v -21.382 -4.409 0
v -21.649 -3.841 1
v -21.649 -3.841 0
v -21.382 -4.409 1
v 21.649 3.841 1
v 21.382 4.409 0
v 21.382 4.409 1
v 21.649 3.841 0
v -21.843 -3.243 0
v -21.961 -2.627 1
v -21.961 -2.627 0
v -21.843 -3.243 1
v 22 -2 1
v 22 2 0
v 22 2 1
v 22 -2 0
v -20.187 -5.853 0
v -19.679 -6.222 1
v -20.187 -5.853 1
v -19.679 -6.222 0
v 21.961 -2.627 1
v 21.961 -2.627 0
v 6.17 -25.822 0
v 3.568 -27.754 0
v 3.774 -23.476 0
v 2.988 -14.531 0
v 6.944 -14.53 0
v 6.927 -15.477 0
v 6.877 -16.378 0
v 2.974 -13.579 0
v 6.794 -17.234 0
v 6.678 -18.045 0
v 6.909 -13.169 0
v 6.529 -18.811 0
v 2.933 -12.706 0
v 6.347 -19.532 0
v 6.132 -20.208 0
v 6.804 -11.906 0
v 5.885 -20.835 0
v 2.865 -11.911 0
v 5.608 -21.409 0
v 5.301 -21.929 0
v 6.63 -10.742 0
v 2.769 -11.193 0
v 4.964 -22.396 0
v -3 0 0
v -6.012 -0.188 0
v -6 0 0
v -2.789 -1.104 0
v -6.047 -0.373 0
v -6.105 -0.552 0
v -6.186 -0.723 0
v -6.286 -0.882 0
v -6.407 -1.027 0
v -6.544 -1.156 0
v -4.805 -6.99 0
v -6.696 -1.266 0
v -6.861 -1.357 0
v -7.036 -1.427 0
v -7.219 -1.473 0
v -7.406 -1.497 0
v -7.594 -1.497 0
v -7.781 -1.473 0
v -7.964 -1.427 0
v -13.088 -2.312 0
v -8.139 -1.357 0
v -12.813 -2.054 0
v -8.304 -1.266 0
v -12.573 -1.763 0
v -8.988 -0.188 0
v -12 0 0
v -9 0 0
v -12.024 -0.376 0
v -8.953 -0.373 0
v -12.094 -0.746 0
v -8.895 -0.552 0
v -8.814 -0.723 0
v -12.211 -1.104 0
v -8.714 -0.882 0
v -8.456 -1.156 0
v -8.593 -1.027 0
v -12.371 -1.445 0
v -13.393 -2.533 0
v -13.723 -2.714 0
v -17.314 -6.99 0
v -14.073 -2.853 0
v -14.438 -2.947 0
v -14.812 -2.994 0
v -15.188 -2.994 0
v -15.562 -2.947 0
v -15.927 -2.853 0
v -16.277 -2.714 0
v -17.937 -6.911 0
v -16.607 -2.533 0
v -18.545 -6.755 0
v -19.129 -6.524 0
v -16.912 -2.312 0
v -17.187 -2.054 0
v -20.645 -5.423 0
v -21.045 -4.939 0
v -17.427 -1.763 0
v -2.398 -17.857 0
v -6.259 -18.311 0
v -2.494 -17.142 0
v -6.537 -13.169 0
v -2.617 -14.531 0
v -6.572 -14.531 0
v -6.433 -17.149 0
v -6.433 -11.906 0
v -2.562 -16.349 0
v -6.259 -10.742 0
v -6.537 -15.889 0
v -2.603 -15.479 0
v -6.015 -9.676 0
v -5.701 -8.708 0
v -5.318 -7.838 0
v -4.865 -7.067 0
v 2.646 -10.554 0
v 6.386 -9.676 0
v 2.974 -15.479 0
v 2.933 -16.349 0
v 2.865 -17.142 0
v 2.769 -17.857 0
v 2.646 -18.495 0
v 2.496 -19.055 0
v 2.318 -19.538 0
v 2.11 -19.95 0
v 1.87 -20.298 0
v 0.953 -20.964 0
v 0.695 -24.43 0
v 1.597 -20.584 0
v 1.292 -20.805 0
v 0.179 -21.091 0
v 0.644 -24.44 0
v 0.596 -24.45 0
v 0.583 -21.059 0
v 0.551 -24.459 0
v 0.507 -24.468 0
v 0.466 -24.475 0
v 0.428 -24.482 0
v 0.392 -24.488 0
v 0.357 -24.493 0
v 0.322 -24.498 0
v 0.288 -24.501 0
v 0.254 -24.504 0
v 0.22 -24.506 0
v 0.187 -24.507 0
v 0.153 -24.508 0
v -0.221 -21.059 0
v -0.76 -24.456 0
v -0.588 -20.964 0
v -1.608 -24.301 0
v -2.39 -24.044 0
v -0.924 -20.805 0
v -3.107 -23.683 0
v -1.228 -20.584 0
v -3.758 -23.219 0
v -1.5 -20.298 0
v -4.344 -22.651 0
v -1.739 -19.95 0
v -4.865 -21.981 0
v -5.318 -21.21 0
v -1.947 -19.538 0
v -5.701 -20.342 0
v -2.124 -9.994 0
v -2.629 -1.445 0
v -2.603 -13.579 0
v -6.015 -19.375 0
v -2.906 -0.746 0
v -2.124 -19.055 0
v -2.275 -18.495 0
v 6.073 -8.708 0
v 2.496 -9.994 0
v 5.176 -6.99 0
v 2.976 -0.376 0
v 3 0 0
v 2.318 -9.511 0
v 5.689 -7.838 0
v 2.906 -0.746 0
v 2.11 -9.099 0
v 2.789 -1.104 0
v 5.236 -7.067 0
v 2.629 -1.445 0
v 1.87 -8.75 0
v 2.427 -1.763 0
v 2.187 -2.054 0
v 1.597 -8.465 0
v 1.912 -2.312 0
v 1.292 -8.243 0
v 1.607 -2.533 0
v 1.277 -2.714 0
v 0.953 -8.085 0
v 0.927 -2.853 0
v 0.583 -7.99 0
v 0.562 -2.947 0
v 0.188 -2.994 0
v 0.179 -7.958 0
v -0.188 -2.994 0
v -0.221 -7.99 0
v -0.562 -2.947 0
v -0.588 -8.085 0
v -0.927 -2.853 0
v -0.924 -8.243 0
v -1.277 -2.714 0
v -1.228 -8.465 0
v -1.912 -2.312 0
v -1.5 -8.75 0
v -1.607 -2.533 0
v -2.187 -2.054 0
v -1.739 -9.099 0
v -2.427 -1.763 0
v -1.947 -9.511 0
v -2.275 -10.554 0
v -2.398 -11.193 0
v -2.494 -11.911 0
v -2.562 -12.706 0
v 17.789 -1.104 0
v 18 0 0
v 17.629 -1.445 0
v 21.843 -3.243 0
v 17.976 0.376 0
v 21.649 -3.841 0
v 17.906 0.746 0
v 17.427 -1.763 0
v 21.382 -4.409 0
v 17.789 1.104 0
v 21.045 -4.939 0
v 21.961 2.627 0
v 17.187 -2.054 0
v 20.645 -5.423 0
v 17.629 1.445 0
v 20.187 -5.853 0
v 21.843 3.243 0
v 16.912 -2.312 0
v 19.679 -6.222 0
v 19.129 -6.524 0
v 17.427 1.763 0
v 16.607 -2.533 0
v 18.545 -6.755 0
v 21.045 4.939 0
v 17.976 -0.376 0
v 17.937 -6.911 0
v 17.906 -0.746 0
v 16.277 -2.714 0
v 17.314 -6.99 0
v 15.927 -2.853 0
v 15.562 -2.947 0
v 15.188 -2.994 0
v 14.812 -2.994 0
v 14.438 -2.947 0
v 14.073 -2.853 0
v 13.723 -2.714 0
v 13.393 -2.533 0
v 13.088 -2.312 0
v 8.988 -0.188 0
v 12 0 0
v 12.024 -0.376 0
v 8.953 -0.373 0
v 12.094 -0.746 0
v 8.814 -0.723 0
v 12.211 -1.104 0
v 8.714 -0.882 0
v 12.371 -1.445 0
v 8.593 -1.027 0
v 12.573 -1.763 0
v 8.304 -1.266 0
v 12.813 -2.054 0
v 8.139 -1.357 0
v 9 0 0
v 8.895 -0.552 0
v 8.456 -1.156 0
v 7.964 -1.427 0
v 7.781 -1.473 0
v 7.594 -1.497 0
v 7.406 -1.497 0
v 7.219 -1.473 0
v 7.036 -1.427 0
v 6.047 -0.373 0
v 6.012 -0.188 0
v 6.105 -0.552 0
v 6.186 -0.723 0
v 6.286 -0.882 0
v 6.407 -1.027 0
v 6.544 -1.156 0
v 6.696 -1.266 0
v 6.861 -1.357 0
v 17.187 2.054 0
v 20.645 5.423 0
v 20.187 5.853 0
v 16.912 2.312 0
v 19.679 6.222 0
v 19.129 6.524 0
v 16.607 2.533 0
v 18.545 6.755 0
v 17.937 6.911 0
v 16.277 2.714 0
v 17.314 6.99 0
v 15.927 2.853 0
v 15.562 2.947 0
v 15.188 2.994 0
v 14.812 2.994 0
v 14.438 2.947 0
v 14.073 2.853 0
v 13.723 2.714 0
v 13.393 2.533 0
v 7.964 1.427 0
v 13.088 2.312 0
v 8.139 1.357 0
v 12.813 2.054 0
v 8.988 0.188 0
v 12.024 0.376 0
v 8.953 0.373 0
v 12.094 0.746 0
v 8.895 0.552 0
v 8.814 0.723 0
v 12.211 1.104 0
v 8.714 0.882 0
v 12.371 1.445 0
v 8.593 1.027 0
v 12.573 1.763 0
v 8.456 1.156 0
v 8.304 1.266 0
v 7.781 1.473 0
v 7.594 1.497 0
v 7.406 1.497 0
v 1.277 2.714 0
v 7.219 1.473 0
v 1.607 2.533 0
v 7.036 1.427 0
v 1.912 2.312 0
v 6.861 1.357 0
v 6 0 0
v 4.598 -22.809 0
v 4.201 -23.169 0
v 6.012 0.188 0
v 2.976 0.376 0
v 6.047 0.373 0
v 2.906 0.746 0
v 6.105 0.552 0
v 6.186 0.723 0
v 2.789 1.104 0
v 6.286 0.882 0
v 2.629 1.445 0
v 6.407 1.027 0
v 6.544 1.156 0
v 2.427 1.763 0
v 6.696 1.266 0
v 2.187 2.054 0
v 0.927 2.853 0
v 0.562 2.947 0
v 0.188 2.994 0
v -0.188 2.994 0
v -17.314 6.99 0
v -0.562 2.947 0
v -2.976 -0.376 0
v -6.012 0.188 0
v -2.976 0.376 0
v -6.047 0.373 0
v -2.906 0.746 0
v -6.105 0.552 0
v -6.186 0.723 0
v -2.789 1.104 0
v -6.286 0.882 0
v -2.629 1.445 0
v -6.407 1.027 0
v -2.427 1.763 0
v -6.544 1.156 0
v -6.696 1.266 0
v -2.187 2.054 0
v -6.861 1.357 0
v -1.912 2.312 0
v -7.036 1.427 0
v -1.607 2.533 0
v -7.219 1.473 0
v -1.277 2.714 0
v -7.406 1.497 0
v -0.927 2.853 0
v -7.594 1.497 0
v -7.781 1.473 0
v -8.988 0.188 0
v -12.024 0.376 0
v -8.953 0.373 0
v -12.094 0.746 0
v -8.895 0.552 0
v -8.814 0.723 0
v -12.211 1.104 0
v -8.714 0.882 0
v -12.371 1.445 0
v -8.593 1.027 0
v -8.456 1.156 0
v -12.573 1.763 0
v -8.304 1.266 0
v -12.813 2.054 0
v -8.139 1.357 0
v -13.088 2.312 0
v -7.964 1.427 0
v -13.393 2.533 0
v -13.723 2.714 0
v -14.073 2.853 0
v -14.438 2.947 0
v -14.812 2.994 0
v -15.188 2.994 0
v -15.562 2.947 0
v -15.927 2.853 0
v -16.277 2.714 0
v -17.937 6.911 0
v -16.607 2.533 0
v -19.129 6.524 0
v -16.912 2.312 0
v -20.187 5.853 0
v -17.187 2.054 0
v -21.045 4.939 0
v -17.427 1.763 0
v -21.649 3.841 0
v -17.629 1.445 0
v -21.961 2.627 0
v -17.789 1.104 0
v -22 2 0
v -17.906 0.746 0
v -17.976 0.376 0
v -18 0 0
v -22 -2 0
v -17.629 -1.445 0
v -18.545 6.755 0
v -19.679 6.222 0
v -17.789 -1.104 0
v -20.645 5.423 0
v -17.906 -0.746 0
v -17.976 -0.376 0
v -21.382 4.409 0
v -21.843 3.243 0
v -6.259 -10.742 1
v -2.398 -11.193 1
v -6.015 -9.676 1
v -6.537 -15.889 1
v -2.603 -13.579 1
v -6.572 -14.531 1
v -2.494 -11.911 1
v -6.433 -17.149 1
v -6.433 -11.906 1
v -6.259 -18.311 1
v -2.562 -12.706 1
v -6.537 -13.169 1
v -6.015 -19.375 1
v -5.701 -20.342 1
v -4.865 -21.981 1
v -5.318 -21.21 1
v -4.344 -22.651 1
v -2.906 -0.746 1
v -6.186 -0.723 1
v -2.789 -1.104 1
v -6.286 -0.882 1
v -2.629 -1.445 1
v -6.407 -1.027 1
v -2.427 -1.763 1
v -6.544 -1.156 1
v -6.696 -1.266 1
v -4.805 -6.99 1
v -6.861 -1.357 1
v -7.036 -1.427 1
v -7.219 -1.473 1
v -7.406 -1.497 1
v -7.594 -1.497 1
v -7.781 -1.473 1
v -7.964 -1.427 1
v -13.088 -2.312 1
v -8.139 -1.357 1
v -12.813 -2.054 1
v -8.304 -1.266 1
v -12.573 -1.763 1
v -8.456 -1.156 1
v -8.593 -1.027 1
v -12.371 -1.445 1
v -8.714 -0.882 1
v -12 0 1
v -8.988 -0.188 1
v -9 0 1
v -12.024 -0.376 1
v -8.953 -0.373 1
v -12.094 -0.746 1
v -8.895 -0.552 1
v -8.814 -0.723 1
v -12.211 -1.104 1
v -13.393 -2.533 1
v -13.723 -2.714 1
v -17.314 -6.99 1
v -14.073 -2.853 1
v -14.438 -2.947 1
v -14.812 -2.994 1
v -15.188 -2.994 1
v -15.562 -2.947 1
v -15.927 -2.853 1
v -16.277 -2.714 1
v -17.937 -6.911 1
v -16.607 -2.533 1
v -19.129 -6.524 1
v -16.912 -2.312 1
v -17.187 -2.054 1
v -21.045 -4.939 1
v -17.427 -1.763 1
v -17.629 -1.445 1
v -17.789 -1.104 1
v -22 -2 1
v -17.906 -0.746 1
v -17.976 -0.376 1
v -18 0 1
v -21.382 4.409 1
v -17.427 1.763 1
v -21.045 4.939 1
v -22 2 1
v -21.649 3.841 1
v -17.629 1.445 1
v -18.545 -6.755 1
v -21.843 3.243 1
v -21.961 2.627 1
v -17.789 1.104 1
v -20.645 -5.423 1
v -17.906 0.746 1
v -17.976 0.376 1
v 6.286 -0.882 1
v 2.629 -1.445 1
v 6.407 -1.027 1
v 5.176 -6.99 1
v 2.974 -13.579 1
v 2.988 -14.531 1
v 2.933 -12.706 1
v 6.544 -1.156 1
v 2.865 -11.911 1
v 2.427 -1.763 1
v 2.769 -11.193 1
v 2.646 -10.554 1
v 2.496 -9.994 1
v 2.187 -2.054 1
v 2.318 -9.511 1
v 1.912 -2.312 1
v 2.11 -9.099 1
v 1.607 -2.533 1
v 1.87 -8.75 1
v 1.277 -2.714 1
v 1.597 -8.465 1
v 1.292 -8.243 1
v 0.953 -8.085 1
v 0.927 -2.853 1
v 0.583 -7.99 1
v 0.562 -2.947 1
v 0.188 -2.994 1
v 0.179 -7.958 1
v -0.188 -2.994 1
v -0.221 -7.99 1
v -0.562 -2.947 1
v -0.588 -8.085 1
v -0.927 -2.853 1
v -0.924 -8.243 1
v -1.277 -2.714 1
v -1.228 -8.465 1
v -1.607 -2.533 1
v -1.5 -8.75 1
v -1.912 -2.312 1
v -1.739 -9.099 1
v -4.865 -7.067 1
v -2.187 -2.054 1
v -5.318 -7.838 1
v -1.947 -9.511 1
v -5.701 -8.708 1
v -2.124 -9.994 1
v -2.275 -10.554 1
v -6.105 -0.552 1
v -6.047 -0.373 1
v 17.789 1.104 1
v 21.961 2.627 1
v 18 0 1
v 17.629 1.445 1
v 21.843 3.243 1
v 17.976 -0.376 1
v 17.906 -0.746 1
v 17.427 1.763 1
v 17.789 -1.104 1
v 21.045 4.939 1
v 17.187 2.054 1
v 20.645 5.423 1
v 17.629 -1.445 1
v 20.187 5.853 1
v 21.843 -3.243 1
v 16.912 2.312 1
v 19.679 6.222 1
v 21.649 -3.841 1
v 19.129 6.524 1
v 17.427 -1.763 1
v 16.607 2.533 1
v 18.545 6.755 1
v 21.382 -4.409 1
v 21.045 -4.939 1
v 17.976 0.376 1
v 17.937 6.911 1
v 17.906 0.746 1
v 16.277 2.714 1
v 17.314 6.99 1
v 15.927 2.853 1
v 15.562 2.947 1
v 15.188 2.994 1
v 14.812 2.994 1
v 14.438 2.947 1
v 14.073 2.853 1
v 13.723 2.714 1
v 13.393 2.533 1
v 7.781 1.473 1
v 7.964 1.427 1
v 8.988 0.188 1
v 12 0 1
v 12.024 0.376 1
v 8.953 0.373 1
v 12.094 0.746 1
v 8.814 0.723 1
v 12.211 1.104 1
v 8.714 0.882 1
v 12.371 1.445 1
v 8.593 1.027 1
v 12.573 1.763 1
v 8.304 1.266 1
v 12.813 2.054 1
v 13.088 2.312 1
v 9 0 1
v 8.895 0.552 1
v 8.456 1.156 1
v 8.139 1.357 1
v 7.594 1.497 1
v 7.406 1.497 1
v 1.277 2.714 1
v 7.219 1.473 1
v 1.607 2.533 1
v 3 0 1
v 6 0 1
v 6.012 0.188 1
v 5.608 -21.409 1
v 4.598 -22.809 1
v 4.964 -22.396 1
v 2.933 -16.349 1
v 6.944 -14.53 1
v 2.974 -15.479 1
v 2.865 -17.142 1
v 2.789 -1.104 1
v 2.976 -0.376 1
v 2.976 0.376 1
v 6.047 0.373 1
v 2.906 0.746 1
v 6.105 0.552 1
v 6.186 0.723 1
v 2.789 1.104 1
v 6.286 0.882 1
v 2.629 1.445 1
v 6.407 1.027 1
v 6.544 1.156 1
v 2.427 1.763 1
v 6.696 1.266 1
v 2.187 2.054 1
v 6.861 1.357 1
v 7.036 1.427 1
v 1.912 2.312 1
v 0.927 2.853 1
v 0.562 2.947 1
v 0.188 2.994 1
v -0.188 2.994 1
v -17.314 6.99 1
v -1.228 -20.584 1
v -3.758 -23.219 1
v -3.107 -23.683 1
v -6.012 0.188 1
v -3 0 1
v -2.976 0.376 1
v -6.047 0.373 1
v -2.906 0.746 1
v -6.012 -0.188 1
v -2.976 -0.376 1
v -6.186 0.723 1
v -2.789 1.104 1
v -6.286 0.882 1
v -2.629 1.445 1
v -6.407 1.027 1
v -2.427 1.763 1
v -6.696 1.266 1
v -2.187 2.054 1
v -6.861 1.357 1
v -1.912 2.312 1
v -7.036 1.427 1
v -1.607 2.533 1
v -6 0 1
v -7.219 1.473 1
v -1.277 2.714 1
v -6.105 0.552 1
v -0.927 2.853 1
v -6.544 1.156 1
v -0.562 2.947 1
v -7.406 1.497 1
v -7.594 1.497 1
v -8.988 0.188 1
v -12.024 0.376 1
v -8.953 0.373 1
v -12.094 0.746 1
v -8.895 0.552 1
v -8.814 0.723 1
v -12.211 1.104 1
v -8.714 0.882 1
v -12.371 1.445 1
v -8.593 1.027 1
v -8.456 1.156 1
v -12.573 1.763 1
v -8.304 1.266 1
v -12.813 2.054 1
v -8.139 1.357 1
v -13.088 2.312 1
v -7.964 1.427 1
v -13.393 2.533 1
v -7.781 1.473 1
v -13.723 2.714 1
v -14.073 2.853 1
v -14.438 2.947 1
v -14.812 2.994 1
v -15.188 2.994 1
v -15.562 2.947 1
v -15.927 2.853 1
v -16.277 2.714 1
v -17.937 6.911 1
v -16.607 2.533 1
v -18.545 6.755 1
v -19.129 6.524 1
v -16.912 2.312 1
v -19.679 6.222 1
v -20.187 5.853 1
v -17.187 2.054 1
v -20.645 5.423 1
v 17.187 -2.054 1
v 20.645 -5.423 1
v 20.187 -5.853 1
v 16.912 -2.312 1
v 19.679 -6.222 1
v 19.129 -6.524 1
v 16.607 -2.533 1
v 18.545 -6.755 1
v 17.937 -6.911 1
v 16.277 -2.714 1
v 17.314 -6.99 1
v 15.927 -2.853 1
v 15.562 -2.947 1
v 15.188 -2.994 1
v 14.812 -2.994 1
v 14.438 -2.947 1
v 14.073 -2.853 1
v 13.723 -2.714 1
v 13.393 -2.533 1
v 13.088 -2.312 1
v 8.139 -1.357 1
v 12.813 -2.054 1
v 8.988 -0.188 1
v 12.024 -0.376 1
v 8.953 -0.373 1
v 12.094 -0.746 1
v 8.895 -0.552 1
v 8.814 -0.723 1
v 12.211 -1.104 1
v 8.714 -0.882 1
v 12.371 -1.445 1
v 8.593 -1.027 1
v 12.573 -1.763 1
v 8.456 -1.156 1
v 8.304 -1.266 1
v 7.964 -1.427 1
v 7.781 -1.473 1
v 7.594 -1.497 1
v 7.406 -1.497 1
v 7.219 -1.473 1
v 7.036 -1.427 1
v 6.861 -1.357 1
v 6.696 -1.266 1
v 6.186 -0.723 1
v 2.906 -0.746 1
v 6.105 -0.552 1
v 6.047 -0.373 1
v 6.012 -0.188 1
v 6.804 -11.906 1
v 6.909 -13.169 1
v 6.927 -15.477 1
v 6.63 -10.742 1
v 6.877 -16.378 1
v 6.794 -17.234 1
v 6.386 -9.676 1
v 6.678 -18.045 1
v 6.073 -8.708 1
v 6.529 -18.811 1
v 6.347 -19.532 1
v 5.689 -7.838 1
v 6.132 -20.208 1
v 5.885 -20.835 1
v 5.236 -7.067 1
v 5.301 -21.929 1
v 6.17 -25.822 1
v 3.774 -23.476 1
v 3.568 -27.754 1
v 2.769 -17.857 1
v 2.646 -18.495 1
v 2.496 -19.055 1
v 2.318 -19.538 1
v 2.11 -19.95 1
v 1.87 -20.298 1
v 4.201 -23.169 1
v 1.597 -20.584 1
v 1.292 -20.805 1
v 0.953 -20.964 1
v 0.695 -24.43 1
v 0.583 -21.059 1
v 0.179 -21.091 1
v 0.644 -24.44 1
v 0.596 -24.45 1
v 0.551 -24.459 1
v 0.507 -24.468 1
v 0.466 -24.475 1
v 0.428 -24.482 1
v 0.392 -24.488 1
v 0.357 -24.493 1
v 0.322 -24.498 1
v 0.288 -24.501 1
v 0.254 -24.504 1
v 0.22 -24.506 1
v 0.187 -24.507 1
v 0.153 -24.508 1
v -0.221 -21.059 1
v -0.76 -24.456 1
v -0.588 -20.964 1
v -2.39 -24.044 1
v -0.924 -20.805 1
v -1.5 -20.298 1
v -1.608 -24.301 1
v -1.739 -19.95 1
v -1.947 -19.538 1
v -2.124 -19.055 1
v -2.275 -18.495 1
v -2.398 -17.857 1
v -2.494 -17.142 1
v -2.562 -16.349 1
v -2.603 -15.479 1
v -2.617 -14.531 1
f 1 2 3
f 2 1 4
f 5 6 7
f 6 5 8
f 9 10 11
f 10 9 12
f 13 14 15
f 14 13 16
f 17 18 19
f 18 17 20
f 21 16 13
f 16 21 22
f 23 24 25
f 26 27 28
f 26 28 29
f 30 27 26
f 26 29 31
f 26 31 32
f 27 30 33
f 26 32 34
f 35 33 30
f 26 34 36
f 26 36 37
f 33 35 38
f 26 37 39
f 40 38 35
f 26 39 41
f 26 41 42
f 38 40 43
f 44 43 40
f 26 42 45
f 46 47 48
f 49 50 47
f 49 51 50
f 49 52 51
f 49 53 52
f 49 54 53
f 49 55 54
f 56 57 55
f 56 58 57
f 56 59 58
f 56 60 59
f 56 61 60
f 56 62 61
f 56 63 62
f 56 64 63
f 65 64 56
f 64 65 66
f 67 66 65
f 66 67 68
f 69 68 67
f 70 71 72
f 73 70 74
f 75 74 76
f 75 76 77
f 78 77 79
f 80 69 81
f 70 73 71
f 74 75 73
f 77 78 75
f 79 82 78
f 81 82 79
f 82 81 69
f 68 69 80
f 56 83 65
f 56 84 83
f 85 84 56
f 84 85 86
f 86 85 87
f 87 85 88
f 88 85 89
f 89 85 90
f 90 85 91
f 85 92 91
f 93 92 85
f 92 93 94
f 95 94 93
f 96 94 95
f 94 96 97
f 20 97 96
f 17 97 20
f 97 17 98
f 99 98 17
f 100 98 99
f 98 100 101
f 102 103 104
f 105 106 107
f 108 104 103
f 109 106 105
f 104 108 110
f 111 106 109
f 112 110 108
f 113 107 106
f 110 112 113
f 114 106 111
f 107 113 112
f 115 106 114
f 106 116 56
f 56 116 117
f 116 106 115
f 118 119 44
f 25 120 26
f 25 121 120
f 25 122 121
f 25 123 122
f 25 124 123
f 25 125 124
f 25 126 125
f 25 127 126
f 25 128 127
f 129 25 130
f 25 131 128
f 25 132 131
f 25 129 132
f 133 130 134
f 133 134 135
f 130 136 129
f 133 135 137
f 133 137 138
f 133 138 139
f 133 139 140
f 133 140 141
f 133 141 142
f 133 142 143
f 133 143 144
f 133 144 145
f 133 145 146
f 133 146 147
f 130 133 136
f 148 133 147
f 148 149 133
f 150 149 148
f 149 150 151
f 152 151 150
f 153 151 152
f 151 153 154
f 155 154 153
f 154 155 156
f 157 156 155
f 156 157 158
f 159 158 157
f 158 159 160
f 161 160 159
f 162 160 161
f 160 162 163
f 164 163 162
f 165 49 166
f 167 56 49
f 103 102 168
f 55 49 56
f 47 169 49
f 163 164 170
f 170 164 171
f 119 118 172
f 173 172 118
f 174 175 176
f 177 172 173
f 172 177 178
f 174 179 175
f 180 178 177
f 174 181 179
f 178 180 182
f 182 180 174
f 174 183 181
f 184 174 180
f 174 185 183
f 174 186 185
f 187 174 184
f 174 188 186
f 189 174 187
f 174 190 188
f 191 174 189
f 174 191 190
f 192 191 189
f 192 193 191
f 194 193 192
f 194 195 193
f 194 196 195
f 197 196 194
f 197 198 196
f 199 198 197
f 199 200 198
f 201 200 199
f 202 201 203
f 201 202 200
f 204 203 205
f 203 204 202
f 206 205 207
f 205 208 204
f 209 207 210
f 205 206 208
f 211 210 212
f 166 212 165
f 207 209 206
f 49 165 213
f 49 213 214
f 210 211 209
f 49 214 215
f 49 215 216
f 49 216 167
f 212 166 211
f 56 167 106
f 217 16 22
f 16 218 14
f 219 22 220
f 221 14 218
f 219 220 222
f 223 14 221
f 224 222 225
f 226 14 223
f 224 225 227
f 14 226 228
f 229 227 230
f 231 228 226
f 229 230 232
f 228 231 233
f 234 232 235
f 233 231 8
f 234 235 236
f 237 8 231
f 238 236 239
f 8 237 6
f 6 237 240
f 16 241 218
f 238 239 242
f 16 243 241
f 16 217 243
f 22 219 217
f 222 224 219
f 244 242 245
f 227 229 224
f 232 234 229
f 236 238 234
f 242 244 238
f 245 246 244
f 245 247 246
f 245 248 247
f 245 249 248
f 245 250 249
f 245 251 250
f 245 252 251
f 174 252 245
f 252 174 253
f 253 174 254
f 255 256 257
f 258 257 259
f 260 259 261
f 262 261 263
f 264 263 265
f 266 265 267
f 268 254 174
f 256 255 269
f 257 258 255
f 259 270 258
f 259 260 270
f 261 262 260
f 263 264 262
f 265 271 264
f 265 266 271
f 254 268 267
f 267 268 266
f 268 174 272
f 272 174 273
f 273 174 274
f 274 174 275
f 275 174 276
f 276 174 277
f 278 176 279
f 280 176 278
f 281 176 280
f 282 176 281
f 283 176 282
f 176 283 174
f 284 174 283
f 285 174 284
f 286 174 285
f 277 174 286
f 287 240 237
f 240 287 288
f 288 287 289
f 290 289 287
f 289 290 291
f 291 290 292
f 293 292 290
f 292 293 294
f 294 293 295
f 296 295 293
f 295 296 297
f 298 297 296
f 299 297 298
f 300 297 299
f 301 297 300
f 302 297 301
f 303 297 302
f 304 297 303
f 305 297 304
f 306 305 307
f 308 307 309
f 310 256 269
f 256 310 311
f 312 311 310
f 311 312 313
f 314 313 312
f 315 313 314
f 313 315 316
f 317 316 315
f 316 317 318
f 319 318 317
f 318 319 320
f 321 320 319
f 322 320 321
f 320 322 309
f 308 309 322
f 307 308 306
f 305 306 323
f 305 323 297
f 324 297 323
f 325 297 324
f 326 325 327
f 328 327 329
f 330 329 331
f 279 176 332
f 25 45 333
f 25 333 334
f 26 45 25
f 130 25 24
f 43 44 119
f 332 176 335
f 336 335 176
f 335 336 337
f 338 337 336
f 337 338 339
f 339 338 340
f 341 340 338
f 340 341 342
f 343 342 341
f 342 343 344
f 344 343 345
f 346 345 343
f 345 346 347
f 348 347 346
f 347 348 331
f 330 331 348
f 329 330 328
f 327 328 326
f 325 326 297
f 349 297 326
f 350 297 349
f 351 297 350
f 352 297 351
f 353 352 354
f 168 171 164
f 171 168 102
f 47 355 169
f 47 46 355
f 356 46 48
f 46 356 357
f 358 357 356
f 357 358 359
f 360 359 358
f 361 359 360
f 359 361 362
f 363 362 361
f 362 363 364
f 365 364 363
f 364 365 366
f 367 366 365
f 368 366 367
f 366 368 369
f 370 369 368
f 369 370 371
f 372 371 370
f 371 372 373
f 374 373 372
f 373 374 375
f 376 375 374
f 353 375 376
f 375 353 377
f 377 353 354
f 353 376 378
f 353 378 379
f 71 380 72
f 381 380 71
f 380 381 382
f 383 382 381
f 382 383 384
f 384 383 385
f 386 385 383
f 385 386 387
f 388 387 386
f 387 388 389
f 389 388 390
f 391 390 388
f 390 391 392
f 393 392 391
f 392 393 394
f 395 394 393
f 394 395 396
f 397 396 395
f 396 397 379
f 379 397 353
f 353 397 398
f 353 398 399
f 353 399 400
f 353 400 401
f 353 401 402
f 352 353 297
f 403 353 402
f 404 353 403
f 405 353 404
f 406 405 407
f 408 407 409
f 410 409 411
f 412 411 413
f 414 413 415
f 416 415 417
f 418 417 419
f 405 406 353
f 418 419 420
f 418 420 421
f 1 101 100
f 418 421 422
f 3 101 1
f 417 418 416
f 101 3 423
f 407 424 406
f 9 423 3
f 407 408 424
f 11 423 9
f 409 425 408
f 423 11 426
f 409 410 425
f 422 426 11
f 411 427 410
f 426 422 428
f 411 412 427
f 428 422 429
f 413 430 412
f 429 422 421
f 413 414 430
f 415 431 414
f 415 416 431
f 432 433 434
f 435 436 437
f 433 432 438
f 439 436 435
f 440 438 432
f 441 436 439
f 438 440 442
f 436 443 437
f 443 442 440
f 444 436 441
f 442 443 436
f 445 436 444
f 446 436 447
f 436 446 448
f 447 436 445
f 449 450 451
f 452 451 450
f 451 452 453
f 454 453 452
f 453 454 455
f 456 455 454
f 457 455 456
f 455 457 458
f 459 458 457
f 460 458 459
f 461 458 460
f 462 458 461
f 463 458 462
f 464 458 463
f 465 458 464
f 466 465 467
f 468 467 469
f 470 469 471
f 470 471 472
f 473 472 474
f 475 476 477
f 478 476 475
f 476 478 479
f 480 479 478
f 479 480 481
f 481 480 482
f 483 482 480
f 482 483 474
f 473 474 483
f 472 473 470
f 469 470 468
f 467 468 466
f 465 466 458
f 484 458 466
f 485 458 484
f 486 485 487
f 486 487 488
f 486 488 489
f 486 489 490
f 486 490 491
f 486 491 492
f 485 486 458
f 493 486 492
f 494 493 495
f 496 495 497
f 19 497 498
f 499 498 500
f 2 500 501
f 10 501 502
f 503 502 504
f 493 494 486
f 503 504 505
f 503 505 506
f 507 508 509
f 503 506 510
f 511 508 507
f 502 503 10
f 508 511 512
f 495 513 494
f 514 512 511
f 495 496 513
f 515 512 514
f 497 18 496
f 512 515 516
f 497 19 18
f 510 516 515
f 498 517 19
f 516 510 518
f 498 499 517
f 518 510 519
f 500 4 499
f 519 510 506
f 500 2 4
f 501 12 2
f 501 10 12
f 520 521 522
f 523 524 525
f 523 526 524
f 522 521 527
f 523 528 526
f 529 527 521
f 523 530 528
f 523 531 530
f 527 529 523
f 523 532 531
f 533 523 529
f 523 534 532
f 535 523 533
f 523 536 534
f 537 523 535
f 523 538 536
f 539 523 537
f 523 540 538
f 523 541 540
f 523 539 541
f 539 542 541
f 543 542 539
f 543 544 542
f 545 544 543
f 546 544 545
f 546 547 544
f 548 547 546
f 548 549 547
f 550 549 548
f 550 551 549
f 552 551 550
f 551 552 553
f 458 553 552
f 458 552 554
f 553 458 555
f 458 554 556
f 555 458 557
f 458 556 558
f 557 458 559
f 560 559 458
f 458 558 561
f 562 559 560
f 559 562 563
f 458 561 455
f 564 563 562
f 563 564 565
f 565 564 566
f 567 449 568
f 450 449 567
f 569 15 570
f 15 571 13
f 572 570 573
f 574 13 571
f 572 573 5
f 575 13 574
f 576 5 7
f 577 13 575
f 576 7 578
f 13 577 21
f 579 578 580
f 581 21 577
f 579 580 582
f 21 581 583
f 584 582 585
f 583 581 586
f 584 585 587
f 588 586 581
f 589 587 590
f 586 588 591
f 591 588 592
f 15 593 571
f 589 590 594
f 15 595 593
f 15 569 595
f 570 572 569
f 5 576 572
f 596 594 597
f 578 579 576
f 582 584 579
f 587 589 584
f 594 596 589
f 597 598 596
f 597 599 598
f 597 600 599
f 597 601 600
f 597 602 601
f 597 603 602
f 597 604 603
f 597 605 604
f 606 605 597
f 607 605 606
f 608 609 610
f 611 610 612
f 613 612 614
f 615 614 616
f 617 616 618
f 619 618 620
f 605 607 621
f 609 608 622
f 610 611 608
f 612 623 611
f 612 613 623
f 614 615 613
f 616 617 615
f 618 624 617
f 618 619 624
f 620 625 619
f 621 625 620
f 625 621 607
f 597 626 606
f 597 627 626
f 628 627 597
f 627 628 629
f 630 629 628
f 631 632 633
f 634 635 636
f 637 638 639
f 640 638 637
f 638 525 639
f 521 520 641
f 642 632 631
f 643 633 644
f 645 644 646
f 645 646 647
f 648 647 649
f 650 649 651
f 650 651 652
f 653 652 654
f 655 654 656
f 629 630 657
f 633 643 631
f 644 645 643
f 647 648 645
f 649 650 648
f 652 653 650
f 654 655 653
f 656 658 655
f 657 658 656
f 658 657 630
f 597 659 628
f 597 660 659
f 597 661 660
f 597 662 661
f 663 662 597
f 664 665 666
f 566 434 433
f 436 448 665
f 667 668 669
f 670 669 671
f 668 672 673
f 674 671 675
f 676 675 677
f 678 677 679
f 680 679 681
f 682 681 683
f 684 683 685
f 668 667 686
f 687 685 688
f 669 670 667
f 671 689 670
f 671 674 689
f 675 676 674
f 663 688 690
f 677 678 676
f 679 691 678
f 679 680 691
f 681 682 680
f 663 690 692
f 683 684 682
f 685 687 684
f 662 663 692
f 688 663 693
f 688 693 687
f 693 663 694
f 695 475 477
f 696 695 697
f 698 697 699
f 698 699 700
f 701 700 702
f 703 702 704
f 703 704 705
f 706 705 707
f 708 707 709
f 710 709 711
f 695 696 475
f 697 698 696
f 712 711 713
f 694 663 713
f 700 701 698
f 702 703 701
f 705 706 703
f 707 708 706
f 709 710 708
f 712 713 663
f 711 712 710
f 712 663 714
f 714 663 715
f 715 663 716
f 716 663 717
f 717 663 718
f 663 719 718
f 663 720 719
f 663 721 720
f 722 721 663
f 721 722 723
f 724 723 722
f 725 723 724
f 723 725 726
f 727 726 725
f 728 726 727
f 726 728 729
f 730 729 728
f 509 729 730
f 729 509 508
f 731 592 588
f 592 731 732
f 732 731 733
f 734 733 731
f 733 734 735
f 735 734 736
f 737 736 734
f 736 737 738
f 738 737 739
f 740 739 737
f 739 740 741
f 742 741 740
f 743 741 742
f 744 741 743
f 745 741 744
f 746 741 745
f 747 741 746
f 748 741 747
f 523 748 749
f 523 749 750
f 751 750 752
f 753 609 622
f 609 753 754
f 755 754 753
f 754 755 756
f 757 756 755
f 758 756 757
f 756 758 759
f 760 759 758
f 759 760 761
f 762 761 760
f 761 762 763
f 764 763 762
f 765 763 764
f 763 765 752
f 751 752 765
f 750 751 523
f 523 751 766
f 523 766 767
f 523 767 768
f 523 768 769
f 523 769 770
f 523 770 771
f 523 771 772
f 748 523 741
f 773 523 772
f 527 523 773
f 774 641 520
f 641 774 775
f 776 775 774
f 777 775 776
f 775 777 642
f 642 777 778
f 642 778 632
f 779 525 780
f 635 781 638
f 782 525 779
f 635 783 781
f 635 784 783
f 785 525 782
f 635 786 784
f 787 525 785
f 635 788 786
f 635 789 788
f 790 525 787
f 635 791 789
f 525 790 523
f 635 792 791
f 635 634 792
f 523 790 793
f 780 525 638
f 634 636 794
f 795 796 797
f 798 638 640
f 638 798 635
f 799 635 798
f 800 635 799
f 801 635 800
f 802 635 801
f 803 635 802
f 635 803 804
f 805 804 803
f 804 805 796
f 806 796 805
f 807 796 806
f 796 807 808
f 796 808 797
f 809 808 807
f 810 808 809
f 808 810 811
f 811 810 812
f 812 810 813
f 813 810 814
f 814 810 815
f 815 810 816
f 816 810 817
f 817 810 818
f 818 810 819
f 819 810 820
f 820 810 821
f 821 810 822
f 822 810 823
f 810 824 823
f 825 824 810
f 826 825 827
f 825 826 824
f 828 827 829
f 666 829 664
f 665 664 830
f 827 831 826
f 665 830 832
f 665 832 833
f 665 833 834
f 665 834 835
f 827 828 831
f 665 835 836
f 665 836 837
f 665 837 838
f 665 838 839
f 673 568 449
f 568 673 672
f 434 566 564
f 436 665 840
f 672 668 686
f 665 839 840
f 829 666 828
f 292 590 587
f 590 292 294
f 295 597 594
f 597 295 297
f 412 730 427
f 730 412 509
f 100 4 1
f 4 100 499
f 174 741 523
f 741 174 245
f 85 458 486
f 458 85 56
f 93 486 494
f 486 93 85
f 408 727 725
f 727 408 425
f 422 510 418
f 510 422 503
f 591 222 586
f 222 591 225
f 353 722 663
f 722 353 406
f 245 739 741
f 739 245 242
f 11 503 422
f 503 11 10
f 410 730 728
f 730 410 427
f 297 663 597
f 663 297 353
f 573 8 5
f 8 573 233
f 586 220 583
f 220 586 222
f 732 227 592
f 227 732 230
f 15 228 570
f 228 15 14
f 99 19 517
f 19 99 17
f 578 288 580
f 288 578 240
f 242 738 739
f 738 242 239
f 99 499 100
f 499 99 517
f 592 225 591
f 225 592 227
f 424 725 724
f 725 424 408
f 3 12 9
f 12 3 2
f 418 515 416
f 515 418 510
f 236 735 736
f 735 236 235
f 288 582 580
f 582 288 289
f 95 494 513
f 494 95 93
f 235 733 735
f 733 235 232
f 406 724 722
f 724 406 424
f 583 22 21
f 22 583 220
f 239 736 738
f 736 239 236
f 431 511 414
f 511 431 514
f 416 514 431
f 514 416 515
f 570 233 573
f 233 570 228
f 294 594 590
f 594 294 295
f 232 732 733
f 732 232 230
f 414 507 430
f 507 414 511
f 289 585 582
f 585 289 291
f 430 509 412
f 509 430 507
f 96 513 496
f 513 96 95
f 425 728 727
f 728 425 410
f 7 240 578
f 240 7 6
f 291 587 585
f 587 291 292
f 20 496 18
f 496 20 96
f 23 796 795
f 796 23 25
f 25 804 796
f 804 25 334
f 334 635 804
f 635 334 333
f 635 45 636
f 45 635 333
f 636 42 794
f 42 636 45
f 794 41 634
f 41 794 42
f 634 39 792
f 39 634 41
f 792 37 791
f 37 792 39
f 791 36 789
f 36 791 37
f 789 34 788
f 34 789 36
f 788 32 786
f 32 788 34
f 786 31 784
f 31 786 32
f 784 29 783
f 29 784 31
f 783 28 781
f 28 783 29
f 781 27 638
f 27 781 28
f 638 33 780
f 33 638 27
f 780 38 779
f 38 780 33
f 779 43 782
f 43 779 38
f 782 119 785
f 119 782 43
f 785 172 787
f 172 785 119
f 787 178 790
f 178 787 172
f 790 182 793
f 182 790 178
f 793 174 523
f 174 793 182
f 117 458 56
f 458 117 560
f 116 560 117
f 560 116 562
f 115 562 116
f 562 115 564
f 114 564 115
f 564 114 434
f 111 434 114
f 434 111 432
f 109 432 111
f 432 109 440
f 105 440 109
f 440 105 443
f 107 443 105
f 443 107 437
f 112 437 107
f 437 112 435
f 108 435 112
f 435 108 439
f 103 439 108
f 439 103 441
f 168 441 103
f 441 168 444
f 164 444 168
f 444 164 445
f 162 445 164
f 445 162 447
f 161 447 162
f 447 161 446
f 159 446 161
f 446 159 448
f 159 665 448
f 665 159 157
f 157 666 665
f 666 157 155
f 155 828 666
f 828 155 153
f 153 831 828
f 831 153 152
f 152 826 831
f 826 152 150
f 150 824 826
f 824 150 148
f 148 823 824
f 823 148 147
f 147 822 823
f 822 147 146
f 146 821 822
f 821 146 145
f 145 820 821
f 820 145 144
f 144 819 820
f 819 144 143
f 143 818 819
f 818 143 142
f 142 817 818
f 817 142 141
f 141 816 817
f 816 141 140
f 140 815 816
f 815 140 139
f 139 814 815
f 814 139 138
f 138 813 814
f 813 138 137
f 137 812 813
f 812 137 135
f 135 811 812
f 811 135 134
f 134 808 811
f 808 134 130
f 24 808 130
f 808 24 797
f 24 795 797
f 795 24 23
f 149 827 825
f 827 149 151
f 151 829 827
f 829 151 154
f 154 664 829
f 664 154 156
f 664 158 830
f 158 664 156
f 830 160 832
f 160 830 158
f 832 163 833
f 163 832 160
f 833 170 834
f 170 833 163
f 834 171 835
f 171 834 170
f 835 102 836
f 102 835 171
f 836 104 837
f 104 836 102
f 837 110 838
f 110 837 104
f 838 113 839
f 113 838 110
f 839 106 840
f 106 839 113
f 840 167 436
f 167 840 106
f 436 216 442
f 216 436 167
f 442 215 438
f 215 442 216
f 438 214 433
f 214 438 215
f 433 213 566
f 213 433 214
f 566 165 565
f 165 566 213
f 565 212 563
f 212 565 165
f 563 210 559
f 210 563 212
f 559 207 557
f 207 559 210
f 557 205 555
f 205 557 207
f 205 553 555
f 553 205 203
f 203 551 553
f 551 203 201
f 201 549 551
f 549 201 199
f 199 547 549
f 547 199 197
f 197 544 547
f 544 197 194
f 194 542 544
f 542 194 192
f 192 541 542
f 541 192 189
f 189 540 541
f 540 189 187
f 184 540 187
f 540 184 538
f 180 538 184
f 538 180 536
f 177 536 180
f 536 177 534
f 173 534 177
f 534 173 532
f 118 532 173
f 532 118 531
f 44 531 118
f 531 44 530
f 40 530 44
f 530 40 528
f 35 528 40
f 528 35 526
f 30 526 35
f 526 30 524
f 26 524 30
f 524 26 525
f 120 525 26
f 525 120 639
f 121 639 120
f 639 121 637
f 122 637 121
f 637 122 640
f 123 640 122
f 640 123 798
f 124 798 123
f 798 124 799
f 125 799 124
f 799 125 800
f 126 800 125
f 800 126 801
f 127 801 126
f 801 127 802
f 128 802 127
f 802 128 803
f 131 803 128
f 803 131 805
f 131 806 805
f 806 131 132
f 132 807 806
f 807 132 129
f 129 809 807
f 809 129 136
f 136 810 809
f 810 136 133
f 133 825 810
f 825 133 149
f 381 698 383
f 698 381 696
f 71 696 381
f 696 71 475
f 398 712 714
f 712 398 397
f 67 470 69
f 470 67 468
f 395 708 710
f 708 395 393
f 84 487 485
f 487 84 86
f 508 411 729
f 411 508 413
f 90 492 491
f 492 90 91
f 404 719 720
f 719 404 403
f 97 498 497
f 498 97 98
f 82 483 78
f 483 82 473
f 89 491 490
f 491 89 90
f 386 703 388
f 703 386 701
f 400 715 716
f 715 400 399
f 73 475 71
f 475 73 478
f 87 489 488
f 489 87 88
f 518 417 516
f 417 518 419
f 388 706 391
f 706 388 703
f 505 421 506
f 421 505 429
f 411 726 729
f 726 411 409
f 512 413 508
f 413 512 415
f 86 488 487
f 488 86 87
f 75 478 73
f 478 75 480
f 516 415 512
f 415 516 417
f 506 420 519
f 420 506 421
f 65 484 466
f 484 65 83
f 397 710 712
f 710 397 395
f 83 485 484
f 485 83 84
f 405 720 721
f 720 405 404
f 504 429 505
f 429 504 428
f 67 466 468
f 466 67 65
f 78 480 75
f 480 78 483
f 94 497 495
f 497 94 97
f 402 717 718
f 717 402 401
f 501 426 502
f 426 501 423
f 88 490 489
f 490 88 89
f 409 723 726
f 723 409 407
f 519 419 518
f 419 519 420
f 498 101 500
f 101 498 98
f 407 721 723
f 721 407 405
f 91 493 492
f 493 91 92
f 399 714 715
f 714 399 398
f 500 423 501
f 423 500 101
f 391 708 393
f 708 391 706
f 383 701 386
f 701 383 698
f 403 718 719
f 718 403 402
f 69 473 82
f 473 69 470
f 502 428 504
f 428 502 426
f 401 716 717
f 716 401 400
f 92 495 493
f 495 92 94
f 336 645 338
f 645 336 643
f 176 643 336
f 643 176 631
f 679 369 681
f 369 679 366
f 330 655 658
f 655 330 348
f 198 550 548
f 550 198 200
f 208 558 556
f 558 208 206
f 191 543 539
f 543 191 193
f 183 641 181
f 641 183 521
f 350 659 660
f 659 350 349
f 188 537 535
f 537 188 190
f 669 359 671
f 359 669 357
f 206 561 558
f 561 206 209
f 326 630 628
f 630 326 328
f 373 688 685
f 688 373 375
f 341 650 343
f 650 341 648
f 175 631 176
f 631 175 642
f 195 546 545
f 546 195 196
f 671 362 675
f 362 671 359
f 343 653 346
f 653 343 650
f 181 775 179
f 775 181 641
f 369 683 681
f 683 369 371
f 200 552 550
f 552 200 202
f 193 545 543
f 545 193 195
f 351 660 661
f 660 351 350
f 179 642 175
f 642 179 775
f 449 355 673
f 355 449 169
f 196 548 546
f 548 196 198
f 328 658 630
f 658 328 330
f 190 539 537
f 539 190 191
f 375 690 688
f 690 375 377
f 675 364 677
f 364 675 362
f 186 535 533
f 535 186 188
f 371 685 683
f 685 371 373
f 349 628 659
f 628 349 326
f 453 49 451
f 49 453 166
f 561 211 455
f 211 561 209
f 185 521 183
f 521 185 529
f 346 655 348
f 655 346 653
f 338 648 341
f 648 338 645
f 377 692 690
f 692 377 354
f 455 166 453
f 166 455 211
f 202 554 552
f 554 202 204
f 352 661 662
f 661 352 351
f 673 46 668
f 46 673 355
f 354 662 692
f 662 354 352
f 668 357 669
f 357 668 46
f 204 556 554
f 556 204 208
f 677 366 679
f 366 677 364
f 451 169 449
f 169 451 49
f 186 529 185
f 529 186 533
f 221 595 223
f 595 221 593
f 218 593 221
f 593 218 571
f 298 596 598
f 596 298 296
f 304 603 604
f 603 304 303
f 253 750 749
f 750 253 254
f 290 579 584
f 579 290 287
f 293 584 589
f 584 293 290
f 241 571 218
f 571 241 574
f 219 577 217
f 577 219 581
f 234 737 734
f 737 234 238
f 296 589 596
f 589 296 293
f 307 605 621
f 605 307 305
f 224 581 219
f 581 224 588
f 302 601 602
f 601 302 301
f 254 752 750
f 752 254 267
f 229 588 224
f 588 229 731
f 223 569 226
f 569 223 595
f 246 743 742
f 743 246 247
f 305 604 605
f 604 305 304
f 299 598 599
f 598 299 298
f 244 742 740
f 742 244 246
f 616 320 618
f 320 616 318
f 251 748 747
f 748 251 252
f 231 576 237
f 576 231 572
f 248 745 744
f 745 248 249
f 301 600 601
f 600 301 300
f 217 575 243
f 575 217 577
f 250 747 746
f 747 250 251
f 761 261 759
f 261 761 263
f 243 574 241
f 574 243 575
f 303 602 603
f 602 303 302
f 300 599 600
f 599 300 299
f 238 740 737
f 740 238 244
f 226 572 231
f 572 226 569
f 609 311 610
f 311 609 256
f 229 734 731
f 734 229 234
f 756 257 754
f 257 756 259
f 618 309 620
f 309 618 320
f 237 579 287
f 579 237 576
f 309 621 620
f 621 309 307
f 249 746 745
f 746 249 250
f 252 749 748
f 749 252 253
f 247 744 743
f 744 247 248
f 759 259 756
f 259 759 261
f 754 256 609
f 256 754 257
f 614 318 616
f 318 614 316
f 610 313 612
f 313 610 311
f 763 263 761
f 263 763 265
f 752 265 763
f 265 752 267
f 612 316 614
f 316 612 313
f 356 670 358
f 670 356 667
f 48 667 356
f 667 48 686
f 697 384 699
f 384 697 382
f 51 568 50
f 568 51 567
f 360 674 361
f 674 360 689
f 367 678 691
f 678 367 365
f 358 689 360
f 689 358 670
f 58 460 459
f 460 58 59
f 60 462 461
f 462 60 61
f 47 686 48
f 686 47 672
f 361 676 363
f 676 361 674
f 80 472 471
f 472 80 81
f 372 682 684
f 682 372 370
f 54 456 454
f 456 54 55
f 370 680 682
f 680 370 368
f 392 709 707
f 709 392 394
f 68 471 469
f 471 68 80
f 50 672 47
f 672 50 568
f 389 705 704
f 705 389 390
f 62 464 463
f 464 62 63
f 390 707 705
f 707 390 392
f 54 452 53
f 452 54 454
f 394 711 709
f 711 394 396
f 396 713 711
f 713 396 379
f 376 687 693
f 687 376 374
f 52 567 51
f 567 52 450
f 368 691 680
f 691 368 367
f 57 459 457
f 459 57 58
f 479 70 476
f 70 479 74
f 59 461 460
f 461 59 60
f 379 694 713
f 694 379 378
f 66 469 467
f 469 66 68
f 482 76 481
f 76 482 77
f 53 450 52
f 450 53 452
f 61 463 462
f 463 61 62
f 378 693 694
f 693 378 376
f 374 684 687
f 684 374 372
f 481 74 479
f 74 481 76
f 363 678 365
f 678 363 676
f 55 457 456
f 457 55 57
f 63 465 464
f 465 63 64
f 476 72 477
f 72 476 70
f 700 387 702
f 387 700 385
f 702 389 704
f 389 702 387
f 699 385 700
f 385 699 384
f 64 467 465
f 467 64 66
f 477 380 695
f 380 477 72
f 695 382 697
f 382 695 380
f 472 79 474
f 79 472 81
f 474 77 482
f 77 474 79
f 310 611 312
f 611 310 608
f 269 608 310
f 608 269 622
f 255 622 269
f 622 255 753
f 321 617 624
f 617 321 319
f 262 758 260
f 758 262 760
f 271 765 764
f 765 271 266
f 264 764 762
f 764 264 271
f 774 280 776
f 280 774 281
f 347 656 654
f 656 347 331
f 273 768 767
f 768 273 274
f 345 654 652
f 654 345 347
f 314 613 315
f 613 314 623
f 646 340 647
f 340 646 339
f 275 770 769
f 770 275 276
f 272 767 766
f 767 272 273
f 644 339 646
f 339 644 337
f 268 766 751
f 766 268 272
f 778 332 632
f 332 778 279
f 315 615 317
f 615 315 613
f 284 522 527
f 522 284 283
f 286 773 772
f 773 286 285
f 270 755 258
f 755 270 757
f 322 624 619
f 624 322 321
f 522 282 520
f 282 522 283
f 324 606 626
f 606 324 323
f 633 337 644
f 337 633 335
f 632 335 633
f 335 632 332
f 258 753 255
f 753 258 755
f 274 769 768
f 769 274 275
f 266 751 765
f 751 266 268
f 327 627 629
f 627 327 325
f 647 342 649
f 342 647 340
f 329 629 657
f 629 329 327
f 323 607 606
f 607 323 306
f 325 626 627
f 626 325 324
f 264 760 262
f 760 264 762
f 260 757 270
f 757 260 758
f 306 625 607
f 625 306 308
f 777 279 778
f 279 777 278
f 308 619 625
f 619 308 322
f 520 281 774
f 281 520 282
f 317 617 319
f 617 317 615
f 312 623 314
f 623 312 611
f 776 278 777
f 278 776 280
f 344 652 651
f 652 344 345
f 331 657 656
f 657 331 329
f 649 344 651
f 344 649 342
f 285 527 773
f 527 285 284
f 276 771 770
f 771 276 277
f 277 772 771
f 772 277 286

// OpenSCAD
$fn = 50;


difference() {
	union() {
		hull() {
			translate(v = [-17.0000000000, 2.0000000000, 0]) {
				cylinder(h = 1, r = 5);
			}
			translate(v = [17.0000000000, 2.0000000000, 0]) {
				cylinder(h = 1, r = 5);
			}
			translate(v = [-17.0000000000, -2.0000000000, 0]) {
				cylinder(h = 1, r = 5);
			}
			translate(v = [17.0000000000, -2.0000000000, 0]) {
				cylinder(h = 1, r = 5);
			}
		}
		translate(v = [0, -5, 0]) {
			linear_extrude(height = 1) {
				text(font = "DejaVu Sans Mono:style=Bold", halign = "center", size = 19.0000000000, text = "Q", valign = "top");
			}
		}
	}
	union() {
		translate(v = [-15.0000000000, 0.0000000000, 0]) {
			translate(v = [0, 0, -100]) {
				cylinder(h = 200, r = 3.0000000000);
			}
		}
		translate(v = [0, 0, -100]) {
			cylinder(h = 200, r = 3.0000000000);
		}
		translate(v = [15.0000000000, 0.0000000000, 0]) {
			translate(v = [0, 0, -100]) {
				cylinder(h = 200, r = 3.0000000000);
			}
		}
		translate(v = [-15.0000000000, 0.0000000000, 0]) {
			translate(v = [0, 0, -100]) {
				cylinder(h = 200, r = 1.5000000000);
			}
		}
		translate(v = [-7.5000000000, 0.0000000000, 0]) {
			translate(v = [0, 0, -100]) {
				cylinder(h = 200, r = 1.5000000000);
			}
		}
		translate(v = [0, 0, -100]) {
			cylinder(h = 200, r = 1.5000000000);
		}
		translate(v = [7.5000000000, 0.0000000000, 0]) {
			translate(v = [0, 0, -100]) {
				cylinder(h = 200, r = 1.5000000000);
			}
		}
		translate(v = [15.0000000000, 0.0000000000, 0]) {
			translate(v = [0, 0, -100]) {
				cylinder(h = 200, r = 1.5000000000);
			}
		}
	}
}
